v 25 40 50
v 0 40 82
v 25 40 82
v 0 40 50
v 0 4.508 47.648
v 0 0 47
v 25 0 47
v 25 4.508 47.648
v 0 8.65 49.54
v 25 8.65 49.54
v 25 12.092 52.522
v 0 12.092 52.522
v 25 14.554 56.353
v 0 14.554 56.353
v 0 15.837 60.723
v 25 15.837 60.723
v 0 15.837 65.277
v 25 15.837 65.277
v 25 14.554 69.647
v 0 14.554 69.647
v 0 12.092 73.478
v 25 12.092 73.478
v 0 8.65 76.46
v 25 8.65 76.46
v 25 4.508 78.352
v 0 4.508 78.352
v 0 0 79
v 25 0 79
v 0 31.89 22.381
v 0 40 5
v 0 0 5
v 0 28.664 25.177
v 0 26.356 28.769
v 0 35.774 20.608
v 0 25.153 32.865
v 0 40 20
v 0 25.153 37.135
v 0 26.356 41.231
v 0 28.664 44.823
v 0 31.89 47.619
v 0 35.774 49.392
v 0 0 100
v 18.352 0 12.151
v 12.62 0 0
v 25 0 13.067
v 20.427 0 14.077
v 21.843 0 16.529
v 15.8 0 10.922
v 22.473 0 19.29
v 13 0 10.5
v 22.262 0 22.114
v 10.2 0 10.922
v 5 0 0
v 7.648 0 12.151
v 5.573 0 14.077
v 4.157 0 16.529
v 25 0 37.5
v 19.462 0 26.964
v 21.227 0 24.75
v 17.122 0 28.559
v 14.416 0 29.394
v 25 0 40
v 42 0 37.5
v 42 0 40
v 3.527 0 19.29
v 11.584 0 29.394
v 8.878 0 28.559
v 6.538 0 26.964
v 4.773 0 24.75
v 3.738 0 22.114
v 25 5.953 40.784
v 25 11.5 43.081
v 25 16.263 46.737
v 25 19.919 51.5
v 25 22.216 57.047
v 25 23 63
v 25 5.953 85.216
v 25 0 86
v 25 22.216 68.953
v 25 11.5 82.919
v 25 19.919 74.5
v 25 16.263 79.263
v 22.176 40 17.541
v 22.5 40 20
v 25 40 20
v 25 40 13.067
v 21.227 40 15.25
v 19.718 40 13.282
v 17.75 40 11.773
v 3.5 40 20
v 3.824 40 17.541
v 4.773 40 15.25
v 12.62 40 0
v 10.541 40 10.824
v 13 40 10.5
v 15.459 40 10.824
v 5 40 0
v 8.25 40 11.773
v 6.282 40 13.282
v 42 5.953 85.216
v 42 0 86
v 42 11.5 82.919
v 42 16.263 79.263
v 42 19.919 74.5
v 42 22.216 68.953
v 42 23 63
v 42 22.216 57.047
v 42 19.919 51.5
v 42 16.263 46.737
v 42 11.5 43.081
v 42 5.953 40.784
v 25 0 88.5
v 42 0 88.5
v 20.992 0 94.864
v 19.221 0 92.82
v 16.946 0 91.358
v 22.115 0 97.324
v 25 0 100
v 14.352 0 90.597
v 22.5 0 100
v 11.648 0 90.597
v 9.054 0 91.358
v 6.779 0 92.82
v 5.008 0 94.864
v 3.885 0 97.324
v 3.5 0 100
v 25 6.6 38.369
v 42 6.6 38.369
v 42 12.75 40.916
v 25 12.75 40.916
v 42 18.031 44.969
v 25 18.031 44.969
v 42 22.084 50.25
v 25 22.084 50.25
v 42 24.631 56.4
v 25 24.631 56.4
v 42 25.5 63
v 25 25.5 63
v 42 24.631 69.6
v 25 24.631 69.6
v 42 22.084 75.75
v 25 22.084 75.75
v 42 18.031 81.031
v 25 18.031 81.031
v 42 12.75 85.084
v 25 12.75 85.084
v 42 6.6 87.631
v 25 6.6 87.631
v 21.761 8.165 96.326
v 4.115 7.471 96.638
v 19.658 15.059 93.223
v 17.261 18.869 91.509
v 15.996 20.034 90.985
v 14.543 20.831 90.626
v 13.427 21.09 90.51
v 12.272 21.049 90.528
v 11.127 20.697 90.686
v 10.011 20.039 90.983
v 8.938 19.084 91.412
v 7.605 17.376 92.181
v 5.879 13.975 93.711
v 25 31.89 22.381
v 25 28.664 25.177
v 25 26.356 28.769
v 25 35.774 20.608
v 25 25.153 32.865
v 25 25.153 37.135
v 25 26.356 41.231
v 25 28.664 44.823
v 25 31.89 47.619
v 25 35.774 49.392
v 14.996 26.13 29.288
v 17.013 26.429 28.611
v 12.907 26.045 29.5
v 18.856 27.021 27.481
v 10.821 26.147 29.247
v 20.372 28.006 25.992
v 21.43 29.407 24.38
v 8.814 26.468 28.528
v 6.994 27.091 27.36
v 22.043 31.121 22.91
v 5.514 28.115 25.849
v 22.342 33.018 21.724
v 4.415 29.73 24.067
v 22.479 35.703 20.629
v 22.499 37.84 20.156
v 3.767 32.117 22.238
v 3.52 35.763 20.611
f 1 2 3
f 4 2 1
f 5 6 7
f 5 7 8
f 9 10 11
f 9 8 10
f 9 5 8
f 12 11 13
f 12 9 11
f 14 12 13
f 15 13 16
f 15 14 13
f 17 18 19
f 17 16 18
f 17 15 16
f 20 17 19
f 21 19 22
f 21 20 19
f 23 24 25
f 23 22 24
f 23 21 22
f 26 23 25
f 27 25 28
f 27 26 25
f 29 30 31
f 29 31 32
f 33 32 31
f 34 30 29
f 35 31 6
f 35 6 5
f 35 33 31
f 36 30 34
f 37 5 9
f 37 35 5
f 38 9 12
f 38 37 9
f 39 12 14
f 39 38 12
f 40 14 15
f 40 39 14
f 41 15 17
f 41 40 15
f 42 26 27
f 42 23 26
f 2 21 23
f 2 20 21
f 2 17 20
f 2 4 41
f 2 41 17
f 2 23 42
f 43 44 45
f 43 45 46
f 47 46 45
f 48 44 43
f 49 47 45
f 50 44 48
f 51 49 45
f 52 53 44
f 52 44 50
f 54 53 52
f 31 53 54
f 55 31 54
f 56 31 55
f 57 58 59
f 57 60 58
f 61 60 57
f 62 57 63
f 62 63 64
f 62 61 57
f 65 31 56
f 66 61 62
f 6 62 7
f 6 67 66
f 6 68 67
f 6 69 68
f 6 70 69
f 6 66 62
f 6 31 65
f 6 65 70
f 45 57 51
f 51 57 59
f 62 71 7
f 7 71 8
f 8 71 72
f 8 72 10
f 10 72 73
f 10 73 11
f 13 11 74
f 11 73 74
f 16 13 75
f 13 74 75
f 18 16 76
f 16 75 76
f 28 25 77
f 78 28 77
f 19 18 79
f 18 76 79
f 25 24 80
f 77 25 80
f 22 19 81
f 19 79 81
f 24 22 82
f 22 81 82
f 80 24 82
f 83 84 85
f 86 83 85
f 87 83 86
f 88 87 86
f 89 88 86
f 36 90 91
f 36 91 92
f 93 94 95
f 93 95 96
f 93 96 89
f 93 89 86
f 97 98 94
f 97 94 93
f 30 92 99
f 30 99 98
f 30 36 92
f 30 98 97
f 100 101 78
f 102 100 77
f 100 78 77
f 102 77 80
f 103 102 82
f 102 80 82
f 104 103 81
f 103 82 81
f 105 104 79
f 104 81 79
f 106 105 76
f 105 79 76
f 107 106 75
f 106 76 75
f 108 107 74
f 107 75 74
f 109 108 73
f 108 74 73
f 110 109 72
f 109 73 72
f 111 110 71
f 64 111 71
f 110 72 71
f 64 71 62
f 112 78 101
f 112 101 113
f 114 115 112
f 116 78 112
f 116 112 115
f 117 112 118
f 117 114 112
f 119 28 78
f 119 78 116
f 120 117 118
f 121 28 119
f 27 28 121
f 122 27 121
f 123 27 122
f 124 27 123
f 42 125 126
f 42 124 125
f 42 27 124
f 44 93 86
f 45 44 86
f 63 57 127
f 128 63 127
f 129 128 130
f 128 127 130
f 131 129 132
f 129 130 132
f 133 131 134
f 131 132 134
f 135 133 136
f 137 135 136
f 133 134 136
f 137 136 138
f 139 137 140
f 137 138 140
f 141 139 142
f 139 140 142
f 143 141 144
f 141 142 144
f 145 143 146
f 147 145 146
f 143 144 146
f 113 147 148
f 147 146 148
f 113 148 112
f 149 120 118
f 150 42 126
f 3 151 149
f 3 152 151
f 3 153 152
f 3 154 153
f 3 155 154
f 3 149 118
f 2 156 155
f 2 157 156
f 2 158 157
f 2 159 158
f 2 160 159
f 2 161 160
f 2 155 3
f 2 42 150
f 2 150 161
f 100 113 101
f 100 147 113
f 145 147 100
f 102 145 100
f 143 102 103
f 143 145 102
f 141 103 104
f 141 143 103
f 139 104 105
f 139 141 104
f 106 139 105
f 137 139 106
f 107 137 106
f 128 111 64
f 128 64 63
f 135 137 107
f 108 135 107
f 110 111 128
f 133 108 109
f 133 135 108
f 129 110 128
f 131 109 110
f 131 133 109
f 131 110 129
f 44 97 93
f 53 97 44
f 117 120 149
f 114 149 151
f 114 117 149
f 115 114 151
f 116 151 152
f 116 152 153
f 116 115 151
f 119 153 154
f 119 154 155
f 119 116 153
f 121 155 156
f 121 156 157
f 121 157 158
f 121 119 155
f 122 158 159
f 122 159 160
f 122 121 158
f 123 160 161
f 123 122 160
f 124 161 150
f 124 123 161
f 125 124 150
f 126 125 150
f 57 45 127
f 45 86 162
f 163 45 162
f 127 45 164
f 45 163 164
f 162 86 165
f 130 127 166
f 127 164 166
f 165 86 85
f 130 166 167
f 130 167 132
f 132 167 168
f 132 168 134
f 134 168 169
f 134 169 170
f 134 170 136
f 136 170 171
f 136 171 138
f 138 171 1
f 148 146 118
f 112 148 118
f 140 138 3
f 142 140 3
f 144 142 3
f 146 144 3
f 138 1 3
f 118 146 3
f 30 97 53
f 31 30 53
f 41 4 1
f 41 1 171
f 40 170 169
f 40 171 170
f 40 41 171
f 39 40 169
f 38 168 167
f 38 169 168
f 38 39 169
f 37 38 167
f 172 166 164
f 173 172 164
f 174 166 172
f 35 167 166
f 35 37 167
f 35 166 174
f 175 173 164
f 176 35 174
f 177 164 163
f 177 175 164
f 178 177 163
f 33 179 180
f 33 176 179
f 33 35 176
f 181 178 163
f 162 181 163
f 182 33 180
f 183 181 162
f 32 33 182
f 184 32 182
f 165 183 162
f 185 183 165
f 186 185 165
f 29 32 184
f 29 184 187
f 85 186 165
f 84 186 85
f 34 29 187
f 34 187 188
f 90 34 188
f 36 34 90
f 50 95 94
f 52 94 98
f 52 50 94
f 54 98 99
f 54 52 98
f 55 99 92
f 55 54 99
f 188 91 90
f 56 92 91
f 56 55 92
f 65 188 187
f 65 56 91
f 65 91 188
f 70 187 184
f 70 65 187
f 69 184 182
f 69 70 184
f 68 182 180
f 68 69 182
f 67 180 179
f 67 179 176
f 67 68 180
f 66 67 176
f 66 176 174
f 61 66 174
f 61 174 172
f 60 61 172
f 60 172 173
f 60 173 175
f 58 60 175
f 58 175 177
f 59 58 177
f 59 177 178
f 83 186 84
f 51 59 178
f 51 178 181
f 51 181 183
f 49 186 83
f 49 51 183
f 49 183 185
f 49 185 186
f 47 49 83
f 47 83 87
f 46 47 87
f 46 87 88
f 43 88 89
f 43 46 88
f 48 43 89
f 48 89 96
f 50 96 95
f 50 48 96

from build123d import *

# Parameters (mm, degrees)
SALIENTE_EXTRUIR1_DEPTH    = 25
CORTAR_EXTRUIR1_DEPTH      = 54
CORTAR_EXTRUIR1_DEPTH_BACK = 94
CROQUIS2_R                 = 9.5
CORTAR_EXTRUIR2_DEPTH      = 94
CORTAR_EXTRUIR2_DEPTH_BACK = 94
CROQUIS3_R                 = 15
CROQUIS3_R_2               = 16
CORTAR_EXTRUIR3_DEPTH      = 94
CORTAR_EXTRUIR3_DEPTH_BACK = 94
CHAFL_N2_SIZE              = 5
SALIENTE_EXTRUIR2_DEPTH    = 17


with BuildPart() as part:
    # Croquis1 → Saliente-Extruir1 (new body)
    with BuildSketch(Plane(origin=(0, 0, 0), x_dir=(0, 0, -1), z_dir=(1, 0, 0))):
        Polygon((-100, 0), (-82, 40), (0, 40), (0, 0), align=None)
    extrude(amount=SALIENTE_EXTRUIR1_DEPTH)

    # Croquis2 → Cortar-Extruir1 (cut, two sides: drawn at the far end of the back side and taken through both)
    with BuildSketch(Plane(origin=(0, 40, 0), x_dir=(1, 0, 0), z_dir=(0, 1, 0)).offset(-CORTAR_EXTRUIR1_DEPTH_BACK)):
        with Locations((13, -100)):
            Circle(CROQUIS2_R)
        with Locations((13, -20)):
            Circle(CROQUIS2_R)
    extrude(amount=CORTAR_EXTRUIR1_DEPTH + CORTAR_EXTRUIR1_DEPTH_BACK, mode=Mode.SUBTRACT)

    # Croquis3 → Cortar-Extruir2 (cut, two sides: drawn at the far end of the back side and taken through both)
    with BuildSketch(Plane(origin=(25, 0, 0), x_dir=(0, 0, -1), z_dir=(1, 0, 0)).offset(-CORTAR_EXTRUIR2_DEPTH_BACK)):
        with Locations((-35, 40)):
            Circle(CROQUIS3_R)
        with Locations((-63, 0)):
            Circle(CROQUIS3_R_2)
    extrude(amount=CORTAR_EXTRUIR2_DEPTH + CORTAR_EXTRUIR2_DEPTH_BACK, mode=Mode.SUBTRACT)

    # Croquis4 → Cortar-Extruir3 (cut, two sides: drawn at the far end of the back side and taken through both)
    with BuildSketch(Plane(origin=(0, 40, 0), x_dir=(1, 0, 0), z_dir=(0, 1, 0)).offset(-CORTAR_EXTRUIR3_DEPTH_BACK)):
        Polygon((12.62, 0), (25, -13.066583333), (25, 0), align=None)
    extrude(amount=CORTAR_EXTRUIR3_DEPTH + CORTAR_EXTRUIR3_DEPTH_BACK, mode=Mode.SUBTRACT)

    # Chaflán2
    chafl_n2_edges = [part.edges().sort_by_distance(p)[0] for p in [
        (0, 20, 0),
    ]]
    chamfer(chafl_n2_edges, length=CHAFL_N2_SIZE)

    # Croquis5 → Saliente-Extruir2 (add)
    with BuildSketch(Plane(origin=(25, 0, 0), x_dir=(0, 0, -1), z_dir=(1, 0, 0))):
        with BuildLine():
            Line((-88.5, 0), (-86, 0))
            ThreePointArc((-86, 0), (-63, 23), (-40, 0))
            Line((-40, 0), (-37.5, 0))
            ThreePointArc((-37.5, 0), (-63, 25.5), (-88.5, 0))
        make_face()
    extrude(amount=SALIENTE_EXTRUIR2_DEPTH)


solid = part.part
